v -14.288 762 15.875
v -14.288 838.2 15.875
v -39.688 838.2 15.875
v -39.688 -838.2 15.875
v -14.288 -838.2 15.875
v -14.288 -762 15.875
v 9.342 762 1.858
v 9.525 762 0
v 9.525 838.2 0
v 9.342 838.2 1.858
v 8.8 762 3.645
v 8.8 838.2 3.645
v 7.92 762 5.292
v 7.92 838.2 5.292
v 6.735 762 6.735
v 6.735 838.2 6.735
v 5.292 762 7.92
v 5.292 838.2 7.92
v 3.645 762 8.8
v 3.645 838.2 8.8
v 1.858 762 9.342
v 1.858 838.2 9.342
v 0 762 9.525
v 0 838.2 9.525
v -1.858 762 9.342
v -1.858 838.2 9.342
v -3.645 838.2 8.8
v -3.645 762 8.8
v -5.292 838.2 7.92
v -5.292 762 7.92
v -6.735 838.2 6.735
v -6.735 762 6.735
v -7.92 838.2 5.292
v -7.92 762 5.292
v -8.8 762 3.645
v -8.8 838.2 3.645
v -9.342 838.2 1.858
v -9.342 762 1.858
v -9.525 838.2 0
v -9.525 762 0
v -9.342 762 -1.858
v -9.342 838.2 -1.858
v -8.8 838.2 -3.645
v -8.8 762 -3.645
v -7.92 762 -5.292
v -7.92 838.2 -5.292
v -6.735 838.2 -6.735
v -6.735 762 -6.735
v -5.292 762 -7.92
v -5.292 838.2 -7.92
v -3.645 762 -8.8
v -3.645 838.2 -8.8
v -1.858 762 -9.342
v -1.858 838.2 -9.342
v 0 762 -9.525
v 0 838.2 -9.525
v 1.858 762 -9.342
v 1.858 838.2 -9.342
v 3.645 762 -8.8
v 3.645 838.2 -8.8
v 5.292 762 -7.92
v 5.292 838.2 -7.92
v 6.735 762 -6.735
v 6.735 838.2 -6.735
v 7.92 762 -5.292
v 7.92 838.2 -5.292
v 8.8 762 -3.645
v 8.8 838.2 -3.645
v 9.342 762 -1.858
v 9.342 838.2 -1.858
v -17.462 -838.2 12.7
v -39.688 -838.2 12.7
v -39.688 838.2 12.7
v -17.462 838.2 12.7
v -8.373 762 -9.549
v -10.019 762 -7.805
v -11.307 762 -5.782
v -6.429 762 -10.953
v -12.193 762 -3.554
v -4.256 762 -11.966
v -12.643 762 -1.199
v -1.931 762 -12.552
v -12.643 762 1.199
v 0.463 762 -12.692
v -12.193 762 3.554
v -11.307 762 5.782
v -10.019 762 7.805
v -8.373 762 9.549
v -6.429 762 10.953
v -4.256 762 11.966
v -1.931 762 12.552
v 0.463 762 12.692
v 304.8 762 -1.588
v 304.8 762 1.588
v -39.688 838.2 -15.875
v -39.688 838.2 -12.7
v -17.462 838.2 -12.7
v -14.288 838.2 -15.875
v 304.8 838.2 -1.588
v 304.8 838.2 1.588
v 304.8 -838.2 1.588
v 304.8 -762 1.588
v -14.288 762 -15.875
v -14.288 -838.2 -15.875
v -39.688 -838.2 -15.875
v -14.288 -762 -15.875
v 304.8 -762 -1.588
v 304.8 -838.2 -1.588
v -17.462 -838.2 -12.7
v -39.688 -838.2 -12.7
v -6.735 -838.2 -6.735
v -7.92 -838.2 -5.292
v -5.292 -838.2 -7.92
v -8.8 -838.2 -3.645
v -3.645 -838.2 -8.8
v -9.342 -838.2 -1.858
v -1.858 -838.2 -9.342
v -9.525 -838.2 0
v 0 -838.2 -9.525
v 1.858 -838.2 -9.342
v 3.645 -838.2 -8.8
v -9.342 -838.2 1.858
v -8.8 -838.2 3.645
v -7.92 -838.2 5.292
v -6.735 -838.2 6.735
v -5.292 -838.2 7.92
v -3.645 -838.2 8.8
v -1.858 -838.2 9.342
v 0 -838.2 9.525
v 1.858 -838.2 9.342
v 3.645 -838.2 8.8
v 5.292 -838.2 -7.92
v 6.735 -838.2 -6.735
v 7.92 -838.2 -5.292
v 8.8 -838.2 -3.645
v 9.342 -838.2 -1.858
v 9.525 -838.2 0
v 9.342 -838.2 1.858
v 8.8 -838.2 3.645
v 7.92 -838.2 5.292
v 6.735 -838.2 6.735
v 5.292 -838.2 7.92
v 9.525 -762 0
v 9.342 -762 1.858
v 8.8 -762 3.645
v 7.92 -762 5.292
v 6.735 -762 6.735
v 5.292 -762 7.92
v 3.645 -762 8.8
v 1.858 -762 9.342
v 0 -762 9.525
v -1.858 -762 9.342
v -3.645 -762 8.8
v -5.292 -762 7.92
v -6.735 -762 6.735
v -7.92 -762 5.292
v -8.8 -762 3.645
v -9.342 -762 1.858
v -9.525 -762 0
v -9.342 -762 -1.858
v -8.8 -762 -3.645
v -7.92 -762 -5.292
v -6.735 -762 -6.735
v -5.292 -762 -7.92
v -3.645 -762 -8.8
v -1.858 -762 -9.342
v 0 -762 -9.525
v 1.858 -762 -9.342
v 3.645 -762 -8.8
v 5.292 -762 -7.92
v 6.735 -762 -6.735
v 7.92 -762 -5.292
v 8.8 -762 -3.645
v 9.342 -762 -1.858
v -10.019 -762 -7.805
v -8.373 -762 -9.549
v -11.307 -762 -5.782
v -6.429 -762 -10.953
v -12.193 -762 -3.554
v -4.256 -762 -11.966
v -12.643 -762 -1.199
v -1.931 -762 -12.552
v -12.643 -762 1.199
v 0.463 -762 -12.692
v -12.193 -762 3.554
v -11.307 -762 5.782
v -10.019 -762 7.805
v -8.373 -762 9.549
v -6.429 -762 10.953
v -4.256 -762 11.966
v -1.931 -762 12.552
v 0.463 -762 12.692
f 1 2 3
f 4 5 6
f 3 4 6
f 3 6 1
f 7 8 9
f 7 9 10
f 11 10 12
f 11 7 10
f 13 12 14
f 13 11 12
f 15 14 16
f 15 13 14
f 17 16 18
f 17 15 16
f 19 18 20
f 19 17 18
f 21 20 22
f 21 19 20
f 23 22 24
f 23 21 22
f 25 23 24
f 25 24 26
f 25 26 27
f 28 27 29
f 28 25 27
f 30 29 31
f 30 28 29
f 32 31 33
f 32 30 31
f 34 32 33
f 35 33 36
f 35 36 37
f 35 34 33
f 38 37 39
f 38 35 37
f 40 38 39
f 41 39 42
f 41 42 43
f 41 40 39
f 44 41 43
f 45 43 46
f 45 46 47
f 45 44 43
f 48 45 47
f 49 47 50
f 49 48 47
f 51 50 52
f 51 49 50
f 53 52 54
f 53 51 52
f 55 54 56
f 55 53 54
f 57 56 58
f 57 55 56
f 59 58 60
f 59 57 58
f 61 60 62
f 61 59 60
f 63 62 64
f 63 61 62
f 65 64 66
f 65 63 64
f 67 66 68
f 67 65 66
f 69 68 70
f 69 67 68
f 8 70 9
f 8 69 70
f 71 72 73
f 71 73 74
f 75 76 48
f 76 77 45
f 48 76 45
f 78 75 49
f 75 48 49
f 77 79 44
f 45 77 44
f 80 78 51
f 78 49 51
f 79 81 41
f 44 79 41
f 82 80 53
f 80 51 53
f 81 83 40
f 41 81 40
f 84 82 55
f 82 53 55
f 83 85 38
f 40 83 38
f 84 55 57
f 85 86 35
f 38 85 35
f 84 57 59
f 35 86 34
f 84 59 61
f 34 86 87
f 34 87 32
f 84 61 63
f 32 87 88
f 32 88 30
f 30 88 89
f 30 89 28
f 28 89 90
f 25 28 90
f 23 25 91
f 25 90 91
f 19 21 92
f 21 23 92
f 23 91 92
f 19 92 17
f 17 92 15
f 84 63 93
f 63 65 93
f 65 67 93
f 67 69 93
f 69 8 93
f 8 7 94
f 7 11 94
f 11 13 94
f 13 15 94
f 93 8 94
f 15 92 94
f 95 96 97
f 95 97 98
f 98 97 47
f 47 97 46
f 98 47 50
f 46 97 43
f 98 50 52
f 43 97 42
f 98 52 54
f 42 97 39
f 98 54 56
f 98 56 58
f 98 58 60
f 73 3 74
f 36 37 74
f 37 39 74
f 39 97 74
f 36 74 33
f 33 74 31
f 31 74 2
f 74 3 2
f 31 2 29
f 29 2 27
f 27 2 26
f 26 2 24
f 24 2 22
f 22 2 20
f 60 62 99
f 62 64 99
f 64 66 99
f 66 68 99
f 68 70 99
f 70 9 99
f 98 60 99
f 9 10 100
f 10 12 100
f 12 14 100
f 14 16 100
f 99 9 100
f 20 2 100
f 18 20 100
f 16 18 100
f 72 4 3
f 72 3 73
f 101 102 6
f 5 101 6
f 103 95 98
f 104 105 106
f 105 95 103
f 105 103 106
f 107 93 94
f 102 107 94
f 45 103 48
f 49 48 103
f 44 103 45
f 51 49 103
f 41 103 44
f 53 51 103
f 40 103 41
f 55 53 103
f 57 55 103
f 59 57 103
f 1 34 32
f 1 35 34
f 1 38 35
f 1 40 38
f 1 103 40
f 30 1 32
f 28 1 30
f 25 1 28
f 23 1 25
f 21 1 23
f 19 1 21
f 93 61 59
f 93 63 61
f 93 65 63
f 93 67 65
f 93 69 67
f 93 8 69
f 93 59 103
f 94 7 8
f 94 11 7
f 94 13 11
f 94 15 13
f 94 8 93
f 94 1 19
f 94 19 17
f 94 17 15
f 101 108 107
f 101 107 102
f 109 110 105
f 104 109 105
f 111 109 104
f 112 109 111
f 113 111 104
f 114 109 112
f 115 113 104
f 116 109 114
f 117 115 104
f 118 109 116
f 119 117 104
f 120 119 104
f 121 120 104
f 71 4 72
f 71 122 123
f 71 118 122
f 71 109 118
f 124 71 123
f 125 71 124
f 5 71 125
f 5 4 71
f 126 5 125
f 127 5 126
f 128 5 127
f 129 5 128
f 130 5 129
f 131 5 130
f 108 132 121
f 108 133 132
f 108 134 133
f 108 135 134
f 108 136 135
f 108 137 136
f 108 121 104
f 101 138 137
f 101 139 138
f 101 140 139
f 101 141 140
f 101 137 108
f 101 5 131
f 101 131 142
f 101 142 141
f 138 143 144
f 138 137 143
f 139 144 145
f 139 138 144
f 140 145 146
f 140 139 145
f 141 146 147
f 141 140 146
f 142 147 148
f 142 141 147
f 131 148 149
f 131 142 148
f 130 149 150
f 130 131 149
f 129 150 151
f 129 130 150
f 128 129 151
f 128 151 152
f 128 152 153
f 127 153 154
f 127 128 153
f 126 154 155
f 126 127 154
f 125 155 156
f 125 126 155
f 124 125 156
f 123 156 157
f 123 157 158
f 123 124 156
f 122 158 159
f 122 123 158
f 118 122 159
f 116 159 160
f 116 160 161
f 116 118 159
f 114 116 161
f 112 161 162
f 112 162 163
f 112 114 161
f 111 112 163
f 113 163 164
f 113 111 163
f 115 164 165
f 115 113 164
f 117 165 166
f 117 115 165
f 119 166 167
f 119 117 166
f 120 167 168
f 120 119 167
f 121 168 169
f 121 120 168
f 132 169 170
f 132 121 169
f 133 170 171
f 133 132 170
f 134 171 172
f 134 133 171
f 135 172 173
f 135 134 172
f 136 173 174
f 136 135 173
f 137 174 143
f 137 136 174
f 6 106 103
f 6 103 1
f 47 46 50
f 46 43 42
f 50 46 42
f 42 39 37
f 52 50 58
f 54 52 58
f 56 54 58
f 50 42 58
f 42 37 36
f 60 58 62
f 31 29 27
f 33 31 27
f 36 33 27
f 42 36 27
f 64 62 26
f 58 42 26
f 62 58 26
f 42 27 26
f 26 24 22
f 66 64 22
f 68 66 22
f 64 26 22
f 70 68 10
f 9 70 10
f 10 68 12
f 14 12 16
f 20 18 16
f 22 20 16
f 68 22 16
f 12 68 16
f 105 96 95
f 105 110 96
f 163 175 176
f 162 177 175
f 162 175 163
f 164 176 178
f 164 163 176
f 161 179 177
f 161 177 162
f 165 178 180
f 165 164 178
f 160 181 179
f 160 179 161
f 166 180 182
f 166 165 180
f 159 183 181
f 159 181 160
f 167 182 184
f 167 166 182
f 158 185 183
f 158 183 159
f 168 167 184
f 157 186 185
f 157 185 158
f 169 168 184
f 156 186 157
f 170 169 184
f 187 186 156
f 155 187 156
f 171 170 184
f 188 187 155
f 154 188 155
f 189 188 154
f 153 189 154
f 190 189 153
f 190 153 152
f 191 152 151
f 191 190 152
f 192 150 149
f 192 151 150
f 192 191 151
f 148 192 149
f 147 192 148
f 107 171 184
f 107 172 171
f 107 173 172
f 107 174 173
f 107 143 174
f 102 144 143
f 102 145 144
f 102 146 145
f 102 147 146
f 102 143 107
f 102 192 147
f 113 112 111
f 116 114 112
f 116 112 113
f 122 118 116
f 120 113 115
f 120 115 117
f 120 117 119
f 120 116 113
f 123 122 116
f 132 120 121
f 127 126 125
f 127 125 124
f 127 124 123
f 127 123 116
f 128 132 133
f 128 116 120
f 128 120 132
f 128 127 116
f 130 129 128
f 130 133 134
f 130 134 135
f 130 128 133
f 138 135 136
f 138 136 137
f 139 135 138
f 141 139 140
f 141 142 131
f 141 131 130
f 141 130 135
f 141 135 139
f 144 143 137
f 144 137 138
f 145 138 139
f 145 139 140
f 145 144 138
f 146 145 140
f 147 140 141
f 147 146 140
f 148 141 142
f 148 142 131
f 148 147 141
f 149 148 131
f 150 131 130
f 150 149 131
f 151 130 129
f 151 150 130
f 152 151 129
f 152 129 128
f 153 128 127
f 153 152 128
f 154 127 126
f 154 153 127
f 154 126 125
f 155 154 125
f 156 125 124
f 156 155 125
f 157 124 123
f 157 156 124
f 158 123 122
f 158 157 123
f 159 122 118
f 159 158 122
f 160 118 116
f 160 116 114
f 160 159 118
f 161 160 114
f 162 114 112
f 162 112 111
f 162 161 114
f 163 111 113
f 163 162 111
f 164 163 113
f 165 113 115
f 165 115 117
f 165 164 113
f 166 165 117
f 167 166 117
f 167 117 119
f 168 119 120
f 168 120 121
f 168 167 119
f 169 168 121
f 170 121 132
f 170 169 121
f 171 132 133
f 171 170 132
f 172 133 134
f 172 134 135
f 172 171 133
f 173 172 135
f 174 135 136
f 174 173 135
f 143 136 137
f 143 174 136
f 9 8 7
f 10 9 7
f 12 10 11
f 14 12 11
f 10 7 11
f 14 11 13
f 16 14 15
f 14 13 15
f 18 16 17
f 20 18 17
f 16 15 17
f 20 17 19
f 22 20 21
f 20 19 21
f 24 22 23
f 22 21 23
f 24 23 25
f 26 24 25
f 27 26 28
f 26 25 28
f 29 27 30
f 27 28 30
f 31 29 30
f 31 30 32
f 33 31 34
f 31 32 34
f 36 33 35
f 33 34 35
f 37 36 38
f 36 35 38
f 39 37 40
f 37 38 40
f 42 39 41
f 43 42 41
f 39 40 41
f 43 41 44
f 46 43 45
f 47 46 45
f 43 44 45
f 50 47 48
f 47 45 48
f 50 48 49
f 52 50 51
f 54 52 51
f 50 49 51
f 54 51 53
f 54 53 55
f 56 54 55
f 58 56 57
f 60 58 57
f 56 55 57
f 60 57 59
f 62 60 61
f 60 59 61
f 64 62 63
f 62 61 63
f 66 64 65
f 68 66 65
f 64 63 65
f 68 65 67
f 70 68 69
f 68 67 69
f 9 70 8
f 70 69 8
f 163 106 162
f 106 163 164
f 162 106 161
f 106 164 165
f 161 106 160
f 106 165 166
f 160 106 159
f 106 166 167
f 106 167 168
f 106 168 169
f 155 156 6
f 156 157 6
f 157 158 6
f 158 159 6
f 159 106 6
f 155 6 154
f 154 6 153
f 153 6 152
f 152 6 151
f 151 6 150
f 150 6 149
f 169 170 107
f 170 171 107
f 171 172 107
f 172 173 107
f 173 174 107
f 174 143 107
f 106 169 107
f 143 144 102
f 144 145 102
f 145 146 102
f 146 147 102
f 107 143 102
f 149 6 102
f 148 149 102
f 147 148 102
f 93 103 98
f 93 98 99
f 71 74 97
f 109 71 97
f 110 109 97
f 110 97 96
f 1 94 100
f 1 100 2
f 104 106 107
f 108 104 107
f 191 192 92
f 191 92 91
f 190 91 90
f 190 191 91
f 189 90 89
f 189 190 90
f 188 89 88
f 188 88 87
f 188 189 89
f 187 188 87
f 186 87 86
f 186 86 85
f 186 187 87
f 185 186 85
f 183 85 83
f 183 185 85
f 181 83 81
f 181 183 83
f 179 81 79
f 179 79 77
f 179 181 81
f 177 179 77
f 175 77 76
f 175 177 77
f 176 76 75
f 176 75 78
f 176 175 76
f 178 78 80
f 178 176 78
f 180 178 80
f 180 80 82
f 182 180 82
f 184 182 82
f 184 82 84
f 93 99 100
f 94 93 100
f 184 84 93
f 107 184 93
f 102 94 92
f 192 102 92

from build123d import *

# Parameters (mm, degrees)
F0_R     = 9.525
F1_DEPTH = 762
F2_DEPTH = 838.2
F4_DEPTH = 838.2
F5_R     = 9.525
F6_DEPTH = 76.2


# Not quite as in the source:
# - a pattern or mirror of a feature is missing from the dataset's text; its kind, count and spacing are read off the source's solid


with BuildPart() as f1:
    # F0 (on Front) → F1 (new body, symmetric)
    with BuildSketch(Plane.XZ):
        with BuildLine():
            Line((304.8, 1.5875), (0.4630648172, 12.6915551047))
            ThreePointArc((0.4630648172, 12.6915551047), (-12.7, 0), (0.4630648172, -12.6915551047))
            Line((0.4630648172, -12.6915551047), (304.8, -1.5875))
            Line((304.8, -1.5875), (304.8, 1.5875))
        make_face()
        Circle(F0_R, mode=Mode.SUBTRACT)
        Circle(F0_R)
    extrude(amount=F1_DEPTH, both=True)

    # F0 (on Front) → F2 (join, symmetric)
    with BuildSketch(Plane.XZ):
        Circle(F0_R)
    extrude(amount=F2_DEPTH, both=True)


with BuildPart() as f4:
    # F3 (on Front) → F4 (new body, symmetric)
    with BuildSketch(Plane.XZ):
        Polygon((-14.2875, -15.875), (-14.2875, 15.875), (-39.6875, 15.875), (-39.6875, 12.7), (-17.4625, 12.7), (-17.4625, -12.7), (-39.6875, -12.7), (-39.6875, -15.875), align=None)
    extrude(amount=F4_DEPTH, both=True)

    # F5 (on face) → F6 (join)
    with BuildSketch(Plane.XZ.offset(762)):
        Polygon((304.8, -1.5875), (304.8, 1.5875), (-14.2875, 15.875), (-14.2875, -15.875), align=None)
        Circle(F5_R, mode=Mode.SUBTRACT)
    f6 = extrude(amount=F6_DEPTH)

    # F6_copies: F6 across plane
    add(f6.mirror(Plane.ZX))


solid = Compound([f1.part, f4.part])
